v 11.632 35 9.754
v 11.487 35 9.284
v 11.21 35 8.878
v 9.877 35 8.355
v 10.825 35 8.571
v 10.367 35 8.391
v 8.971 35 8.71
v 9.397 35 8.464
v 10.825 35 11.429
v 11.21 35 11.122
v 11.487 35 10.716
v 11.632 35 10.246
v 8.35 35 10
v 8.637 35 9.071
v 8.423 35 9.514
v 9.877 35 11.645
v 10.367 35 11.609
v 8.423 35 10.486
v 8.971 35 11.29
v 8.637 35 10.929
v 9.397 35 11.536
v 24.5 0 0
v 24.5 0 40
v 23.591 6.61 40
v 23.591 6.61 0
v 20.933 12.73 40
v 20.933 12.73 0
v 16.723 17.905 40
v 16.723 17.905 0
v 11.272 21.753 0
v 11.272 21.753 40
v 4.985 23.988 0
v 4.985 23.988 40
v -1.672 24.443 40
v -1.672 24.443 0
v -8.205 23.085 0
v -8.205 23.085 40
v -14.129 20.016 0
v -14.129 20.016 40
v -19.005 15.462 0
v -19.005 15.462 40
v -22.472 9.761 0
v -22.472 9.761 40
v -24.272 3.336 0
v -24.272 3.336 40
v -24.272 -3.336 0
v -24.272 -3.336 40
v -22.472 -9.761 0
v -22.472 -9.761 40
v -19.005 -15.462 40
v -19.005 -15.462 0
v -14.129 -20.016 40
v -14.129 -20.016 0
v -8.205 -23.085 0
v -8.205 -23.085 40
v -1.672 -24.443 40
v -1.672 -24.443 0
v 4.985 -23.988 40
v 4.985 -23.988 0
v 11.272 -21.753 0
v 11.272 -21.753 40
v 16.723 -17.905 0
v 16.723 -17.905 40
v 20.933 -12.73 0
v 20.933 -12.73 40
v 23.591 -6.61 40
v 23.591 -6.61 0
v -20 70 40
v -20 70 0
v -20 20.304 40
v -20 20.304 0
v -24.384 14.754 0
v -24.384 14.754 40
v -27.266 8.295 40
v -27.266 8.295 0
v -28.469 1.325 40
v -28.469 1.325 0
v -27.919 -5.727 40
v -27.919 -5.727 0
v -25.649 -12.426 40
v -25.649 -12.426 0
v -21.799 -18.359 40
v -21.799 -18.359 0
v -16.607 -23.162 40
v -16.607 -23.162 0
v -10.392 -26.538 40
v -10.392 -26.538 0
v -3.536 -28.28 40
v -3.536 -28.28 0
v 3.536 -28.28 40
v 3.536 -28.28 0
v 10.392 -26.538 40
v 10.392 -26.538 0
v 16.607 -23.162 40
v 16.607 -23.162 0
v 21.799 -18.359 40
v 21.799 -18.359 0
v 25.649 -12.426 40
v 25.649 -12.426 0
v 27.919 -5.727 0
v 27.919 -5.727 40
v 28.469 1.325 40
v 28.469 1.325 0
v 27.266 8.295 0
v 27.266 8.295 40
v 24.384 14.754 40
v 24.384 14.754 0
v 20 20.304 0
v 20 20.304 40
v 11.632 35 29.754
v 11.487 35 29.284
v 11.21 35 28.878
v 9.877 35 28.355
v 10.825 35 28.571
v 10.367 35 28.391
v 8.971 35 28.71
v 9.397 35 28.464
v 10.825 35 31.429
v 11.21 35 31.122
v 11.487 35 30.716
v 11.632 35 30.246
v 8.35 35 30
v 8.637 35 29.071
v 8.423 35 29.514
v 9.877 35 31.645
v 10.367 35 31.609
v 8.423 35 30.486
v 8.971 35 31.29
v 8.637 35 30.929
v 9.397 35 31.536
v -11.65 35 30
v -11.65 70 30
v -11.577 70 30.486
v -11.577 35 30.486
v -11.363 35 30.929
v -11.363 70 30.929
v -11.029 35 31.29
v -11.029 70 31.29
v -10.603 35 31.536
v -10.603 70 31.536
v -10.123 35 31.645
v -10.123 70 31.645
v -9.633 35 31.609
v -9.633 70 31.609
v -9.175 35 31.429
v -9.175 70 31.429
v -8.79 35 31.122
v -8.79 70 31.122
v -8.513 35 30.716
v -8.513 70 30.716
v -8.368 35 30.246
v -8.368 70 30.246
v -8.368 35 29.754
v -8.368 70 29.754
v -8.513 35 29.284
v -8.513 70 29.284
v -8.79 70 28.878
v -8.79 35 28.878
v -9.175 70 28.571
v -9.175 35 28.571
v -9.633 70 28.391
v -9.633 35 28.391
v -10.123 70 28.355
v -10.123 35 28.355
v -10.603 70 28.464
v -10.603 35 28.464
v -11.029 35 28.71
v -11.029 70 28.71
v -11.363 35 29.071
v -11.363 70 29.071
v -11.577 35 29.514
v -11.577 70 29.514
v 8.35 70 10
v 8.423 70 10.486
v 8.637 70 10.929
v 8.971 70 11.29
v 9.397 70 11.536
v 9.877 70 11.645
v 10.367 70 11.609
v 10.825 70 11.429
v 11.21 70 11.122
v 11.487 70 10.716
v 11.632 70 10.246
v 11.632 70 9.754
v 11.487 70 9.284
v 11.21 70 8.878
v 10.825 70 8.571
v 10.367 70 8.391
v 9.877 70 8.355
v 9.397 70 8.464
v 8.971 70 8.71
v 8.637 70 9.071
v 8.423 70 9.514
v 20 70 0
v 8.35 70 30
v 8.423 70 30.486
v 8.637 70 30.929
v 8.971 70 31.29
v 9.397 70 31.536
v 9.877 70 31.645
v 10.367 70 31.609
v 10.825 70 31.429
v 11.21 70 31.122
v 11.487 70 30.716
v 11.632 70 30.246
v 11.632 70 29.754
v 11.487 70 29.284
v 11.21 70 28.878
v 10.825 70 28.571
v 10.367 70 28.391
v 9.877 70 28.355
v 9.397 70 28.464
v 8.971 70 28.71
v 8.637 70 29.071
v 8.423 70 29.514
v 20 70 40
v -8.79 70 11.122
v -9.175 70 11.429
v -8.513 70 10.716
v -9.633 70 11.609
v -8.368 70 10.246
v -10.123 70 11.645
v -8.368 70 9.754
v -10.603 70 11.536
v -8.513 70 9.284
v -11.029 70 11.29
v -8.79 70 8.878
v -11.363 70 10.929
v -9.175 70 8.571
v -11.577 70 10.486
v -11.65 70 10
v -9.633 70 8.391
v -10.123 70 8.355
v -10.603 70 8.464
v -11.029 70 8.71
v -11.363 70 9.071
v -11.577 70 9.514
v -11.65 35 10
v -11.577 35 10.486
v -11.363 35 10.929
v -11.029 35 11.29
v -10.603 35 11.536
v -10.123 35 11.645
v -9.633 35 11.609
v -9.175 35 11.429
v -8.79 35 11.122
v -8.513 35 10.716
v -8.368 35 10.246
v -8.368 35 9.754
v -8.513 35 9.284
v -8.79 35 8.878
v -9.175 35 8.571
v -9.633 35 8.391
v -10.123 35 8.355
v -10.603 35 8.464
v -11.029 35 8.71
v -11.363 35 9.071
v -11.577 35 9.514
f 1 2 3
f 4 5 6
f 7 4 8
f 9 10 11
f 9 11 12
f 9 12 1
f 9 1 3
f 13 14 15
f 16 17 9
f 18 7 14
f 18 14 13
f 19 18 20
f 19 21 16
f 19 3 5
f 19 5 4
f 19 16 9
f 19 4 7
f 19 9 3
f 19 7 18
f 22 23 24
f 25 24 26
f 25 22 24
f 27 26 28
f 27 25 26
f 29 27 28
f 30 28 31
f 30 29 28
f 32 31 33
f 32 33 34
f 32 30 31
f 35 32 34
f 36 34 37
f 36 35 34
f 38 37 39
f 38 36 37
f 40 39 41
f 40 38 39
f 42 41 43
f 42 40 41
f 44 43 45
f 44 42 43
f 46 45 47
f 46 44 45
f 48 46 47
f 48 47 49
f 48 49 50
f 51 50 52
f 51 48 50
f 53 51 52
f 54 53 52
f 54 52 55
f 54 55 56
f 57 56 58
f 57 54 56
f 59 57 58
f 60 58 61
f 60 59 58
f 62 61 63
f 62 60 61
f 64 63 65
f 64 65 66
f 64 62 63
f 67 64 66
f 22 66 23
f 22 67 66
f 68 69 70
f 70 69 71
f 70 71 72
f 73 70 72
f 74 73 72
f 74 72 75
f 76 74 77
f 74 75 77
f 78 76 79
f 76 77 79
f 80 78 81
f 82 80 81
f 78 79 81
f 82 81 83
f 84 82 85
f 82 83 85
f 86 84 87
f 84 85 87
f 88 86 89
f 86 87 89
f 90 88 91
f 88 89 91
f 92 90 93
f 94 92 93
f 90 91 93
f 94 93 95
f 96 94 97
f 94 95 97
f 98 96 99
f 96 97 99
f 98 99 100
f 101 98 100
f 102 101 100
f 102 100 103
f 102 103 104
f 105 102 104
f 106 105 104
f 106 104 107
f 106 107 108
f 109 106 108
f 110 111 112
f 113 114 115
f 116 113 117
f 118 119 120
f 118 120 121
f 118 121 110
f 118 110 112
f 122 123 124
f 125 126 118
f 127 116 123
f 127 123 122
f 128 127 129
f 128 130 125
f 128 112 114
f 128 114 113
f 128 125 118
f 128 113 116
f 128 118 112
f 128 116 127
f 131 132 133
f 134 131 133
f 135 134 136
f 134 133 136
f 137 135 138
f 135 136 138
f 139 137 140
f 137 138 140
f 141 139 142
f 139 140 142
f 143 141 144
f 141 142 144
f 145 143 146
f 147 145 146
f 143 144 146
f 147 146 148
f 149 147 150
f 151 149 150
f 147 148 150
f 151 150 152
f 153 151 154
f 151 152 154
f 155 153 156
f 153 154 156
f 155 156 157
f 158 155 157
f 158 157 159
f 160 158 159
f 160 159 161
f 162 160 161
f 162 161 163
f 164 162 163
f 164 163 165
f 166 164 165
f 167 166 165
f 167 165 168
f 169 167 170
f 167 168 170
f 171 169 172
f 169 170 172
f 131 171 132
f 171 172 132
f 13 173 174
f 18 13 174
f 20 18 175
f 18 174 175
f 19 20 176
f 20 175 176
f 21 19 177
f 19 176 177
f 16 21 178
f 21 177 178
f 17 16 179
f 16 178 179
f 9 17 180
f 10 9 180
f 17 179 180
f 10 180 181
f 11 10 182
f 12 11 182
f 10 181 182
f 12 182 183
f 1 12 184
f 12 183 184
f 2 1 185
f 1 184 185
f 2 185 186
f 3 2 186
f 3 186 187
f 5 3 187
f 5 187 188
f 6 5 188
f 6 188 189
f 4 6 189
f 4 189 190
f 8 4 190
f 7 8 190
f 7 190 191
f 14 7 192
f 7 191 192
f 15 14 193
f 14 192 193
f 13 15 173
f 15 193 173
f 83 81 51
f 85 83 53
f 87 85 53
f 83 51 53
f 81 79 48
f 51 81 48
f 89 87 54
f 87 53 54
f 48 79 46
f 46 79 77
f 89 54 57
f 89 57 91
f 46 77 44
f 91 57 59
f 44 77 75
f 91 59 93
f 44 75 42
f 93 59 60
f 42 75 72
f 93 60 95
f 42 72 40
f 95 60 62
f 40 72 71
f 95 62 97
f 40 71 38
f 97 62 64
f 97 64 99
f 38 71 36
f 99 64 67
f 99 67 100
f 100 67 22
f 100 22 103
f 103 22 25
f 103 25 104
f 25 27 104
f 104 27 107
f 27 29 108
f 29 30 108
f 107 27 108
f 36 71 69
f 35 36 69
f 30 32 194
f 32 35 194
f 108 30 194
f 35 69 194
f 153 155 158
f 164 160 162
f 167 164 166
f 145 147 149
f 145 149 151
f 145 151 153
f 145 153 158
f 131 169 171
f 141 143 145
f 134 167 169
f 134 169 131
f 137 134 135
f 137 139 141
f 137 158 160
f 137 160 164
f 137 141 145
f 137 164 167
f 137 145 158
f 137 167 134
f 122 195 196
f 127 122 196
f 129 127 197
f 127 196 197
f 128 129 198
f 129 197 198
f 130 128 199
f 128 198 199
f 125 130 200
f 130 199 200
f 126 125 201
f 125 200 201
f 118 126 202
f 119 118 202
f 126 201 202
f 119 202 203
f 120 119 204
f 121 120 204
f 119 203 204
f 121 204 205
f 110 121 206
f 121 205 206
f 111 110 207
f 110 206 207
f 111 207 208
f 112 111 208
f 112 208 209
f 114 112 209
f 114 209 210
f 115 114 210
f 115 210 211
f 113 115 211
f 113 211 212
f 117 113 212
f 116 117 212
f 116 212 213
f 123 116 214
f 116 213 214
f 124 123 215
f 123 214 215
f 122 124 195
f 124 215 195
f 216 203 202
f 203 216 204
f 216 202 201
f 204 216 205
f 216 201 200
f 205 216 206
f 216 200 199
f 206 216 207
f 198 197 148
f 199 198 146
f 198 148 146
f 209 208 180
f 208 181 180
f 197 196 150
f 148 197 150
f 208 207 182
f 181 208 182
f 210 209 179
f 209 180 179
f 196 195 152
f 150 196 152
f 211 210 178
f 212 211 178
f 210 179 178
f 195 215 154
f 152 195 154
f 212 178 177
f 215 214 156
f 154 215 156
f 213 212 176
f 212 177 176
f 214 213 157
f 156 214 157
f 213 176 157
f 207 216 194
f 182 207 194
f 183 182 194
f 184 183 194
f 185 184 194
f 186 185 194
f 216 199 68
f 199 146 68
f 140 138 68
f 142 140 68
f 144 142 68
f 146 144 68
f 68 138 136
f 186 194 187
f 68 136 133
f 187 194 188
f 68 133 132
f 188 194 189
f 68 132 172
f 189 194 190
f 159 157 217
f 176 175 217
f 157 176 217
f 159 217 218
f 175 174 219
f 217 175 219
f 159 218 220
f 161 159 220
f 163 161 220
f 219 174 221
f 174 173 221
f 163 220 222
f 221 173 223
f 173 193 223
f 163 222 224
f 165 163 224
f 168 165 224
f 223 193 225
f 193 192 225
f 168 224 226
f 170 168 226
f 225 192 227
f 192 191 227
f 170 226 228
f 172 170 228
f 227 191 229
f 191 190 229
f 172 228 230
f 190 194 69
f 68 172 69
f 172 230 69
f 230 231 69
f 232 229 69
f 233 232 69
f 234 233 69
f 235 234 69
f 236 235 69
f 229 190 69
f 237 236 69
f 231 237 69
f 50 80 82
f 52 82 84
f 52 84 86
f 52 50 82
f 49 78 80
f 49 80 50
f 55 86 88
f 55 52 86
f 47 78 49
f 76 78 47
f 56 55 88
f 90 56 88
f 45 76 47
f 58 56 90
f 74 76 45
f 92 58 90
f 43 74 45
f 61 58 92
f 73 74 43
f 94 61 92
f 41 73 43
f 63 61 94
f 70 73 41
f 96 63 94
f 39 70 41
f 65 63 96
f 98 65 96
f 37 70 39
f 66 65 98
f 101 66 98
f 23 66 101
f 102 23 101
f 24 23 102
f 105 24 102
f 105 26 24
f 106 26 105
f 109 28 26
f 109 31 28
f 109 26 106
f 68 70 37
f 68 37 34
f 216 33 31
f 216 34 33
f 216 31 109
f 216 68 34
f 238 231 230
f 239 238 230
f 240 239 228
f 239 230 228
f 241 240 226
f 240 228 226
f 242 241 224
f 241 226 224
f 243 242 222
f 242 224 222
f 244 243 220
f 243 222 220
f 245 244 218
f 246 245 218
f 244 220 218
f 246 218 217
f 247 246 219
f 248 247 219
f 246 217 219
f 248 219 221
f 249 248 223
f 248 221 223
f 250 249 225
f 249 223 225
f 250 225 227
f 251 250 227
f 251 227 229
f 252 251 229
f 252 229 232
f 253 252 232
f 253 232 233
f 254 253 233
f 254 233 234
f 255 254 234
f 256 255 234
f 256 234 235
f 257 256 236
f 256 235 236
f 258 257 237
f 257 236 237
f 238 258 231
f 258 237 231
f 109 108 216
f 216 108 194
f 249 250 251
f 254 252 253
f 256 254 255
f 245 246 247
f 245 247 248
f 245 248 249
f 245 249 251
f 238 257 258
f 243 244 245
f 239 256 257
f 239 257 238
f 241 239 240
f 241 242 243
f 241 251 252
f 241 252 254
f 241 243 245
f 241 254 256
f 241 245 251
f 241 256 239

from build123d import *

# Parameters (mm, degrees)
F0_R     = 24.5
F1_DEPTH = 40
F2_R     = 1.65
F3_DEPTH = 35


with BuildPart() as f1:
    # F0 (on Top) → F1 (new body)
    with BuildSketch(Plane.XY):
        with BuildLine():
            Line((20, 70), (-20, 70))
            Line((-20, 70), (-20, 20.303941))
            ThreePointArc((-20, 20.303941), (0, -28.5), (20, 20.303941))
            Line((20, 20.303941), (20, 70))
        make_face()
        Circle(F0_R, mode=Mode.SUBTRACT)
    extrude(amount=F1_DEPTH)

    # F2 (on face) → F3 (cut)
    with BuildSketch(Plane(origin=(0, 70, 0), x_dir=(-1, 0, 0), z_dir=(0, 1, 0))):
        with Locations((-10, 30)):
            Circle(F2_R)
        with Locations((10, 30)):
            Circle(F2_R)
        with Locations((10, 10)):
            Circle(F2_R)
        with Locations((-10, 10)):
            Circle(F2_R)
    extrude(amount=-F3_DEPTH, mode=Mode.SUBTRACT)


solid = f1.part
